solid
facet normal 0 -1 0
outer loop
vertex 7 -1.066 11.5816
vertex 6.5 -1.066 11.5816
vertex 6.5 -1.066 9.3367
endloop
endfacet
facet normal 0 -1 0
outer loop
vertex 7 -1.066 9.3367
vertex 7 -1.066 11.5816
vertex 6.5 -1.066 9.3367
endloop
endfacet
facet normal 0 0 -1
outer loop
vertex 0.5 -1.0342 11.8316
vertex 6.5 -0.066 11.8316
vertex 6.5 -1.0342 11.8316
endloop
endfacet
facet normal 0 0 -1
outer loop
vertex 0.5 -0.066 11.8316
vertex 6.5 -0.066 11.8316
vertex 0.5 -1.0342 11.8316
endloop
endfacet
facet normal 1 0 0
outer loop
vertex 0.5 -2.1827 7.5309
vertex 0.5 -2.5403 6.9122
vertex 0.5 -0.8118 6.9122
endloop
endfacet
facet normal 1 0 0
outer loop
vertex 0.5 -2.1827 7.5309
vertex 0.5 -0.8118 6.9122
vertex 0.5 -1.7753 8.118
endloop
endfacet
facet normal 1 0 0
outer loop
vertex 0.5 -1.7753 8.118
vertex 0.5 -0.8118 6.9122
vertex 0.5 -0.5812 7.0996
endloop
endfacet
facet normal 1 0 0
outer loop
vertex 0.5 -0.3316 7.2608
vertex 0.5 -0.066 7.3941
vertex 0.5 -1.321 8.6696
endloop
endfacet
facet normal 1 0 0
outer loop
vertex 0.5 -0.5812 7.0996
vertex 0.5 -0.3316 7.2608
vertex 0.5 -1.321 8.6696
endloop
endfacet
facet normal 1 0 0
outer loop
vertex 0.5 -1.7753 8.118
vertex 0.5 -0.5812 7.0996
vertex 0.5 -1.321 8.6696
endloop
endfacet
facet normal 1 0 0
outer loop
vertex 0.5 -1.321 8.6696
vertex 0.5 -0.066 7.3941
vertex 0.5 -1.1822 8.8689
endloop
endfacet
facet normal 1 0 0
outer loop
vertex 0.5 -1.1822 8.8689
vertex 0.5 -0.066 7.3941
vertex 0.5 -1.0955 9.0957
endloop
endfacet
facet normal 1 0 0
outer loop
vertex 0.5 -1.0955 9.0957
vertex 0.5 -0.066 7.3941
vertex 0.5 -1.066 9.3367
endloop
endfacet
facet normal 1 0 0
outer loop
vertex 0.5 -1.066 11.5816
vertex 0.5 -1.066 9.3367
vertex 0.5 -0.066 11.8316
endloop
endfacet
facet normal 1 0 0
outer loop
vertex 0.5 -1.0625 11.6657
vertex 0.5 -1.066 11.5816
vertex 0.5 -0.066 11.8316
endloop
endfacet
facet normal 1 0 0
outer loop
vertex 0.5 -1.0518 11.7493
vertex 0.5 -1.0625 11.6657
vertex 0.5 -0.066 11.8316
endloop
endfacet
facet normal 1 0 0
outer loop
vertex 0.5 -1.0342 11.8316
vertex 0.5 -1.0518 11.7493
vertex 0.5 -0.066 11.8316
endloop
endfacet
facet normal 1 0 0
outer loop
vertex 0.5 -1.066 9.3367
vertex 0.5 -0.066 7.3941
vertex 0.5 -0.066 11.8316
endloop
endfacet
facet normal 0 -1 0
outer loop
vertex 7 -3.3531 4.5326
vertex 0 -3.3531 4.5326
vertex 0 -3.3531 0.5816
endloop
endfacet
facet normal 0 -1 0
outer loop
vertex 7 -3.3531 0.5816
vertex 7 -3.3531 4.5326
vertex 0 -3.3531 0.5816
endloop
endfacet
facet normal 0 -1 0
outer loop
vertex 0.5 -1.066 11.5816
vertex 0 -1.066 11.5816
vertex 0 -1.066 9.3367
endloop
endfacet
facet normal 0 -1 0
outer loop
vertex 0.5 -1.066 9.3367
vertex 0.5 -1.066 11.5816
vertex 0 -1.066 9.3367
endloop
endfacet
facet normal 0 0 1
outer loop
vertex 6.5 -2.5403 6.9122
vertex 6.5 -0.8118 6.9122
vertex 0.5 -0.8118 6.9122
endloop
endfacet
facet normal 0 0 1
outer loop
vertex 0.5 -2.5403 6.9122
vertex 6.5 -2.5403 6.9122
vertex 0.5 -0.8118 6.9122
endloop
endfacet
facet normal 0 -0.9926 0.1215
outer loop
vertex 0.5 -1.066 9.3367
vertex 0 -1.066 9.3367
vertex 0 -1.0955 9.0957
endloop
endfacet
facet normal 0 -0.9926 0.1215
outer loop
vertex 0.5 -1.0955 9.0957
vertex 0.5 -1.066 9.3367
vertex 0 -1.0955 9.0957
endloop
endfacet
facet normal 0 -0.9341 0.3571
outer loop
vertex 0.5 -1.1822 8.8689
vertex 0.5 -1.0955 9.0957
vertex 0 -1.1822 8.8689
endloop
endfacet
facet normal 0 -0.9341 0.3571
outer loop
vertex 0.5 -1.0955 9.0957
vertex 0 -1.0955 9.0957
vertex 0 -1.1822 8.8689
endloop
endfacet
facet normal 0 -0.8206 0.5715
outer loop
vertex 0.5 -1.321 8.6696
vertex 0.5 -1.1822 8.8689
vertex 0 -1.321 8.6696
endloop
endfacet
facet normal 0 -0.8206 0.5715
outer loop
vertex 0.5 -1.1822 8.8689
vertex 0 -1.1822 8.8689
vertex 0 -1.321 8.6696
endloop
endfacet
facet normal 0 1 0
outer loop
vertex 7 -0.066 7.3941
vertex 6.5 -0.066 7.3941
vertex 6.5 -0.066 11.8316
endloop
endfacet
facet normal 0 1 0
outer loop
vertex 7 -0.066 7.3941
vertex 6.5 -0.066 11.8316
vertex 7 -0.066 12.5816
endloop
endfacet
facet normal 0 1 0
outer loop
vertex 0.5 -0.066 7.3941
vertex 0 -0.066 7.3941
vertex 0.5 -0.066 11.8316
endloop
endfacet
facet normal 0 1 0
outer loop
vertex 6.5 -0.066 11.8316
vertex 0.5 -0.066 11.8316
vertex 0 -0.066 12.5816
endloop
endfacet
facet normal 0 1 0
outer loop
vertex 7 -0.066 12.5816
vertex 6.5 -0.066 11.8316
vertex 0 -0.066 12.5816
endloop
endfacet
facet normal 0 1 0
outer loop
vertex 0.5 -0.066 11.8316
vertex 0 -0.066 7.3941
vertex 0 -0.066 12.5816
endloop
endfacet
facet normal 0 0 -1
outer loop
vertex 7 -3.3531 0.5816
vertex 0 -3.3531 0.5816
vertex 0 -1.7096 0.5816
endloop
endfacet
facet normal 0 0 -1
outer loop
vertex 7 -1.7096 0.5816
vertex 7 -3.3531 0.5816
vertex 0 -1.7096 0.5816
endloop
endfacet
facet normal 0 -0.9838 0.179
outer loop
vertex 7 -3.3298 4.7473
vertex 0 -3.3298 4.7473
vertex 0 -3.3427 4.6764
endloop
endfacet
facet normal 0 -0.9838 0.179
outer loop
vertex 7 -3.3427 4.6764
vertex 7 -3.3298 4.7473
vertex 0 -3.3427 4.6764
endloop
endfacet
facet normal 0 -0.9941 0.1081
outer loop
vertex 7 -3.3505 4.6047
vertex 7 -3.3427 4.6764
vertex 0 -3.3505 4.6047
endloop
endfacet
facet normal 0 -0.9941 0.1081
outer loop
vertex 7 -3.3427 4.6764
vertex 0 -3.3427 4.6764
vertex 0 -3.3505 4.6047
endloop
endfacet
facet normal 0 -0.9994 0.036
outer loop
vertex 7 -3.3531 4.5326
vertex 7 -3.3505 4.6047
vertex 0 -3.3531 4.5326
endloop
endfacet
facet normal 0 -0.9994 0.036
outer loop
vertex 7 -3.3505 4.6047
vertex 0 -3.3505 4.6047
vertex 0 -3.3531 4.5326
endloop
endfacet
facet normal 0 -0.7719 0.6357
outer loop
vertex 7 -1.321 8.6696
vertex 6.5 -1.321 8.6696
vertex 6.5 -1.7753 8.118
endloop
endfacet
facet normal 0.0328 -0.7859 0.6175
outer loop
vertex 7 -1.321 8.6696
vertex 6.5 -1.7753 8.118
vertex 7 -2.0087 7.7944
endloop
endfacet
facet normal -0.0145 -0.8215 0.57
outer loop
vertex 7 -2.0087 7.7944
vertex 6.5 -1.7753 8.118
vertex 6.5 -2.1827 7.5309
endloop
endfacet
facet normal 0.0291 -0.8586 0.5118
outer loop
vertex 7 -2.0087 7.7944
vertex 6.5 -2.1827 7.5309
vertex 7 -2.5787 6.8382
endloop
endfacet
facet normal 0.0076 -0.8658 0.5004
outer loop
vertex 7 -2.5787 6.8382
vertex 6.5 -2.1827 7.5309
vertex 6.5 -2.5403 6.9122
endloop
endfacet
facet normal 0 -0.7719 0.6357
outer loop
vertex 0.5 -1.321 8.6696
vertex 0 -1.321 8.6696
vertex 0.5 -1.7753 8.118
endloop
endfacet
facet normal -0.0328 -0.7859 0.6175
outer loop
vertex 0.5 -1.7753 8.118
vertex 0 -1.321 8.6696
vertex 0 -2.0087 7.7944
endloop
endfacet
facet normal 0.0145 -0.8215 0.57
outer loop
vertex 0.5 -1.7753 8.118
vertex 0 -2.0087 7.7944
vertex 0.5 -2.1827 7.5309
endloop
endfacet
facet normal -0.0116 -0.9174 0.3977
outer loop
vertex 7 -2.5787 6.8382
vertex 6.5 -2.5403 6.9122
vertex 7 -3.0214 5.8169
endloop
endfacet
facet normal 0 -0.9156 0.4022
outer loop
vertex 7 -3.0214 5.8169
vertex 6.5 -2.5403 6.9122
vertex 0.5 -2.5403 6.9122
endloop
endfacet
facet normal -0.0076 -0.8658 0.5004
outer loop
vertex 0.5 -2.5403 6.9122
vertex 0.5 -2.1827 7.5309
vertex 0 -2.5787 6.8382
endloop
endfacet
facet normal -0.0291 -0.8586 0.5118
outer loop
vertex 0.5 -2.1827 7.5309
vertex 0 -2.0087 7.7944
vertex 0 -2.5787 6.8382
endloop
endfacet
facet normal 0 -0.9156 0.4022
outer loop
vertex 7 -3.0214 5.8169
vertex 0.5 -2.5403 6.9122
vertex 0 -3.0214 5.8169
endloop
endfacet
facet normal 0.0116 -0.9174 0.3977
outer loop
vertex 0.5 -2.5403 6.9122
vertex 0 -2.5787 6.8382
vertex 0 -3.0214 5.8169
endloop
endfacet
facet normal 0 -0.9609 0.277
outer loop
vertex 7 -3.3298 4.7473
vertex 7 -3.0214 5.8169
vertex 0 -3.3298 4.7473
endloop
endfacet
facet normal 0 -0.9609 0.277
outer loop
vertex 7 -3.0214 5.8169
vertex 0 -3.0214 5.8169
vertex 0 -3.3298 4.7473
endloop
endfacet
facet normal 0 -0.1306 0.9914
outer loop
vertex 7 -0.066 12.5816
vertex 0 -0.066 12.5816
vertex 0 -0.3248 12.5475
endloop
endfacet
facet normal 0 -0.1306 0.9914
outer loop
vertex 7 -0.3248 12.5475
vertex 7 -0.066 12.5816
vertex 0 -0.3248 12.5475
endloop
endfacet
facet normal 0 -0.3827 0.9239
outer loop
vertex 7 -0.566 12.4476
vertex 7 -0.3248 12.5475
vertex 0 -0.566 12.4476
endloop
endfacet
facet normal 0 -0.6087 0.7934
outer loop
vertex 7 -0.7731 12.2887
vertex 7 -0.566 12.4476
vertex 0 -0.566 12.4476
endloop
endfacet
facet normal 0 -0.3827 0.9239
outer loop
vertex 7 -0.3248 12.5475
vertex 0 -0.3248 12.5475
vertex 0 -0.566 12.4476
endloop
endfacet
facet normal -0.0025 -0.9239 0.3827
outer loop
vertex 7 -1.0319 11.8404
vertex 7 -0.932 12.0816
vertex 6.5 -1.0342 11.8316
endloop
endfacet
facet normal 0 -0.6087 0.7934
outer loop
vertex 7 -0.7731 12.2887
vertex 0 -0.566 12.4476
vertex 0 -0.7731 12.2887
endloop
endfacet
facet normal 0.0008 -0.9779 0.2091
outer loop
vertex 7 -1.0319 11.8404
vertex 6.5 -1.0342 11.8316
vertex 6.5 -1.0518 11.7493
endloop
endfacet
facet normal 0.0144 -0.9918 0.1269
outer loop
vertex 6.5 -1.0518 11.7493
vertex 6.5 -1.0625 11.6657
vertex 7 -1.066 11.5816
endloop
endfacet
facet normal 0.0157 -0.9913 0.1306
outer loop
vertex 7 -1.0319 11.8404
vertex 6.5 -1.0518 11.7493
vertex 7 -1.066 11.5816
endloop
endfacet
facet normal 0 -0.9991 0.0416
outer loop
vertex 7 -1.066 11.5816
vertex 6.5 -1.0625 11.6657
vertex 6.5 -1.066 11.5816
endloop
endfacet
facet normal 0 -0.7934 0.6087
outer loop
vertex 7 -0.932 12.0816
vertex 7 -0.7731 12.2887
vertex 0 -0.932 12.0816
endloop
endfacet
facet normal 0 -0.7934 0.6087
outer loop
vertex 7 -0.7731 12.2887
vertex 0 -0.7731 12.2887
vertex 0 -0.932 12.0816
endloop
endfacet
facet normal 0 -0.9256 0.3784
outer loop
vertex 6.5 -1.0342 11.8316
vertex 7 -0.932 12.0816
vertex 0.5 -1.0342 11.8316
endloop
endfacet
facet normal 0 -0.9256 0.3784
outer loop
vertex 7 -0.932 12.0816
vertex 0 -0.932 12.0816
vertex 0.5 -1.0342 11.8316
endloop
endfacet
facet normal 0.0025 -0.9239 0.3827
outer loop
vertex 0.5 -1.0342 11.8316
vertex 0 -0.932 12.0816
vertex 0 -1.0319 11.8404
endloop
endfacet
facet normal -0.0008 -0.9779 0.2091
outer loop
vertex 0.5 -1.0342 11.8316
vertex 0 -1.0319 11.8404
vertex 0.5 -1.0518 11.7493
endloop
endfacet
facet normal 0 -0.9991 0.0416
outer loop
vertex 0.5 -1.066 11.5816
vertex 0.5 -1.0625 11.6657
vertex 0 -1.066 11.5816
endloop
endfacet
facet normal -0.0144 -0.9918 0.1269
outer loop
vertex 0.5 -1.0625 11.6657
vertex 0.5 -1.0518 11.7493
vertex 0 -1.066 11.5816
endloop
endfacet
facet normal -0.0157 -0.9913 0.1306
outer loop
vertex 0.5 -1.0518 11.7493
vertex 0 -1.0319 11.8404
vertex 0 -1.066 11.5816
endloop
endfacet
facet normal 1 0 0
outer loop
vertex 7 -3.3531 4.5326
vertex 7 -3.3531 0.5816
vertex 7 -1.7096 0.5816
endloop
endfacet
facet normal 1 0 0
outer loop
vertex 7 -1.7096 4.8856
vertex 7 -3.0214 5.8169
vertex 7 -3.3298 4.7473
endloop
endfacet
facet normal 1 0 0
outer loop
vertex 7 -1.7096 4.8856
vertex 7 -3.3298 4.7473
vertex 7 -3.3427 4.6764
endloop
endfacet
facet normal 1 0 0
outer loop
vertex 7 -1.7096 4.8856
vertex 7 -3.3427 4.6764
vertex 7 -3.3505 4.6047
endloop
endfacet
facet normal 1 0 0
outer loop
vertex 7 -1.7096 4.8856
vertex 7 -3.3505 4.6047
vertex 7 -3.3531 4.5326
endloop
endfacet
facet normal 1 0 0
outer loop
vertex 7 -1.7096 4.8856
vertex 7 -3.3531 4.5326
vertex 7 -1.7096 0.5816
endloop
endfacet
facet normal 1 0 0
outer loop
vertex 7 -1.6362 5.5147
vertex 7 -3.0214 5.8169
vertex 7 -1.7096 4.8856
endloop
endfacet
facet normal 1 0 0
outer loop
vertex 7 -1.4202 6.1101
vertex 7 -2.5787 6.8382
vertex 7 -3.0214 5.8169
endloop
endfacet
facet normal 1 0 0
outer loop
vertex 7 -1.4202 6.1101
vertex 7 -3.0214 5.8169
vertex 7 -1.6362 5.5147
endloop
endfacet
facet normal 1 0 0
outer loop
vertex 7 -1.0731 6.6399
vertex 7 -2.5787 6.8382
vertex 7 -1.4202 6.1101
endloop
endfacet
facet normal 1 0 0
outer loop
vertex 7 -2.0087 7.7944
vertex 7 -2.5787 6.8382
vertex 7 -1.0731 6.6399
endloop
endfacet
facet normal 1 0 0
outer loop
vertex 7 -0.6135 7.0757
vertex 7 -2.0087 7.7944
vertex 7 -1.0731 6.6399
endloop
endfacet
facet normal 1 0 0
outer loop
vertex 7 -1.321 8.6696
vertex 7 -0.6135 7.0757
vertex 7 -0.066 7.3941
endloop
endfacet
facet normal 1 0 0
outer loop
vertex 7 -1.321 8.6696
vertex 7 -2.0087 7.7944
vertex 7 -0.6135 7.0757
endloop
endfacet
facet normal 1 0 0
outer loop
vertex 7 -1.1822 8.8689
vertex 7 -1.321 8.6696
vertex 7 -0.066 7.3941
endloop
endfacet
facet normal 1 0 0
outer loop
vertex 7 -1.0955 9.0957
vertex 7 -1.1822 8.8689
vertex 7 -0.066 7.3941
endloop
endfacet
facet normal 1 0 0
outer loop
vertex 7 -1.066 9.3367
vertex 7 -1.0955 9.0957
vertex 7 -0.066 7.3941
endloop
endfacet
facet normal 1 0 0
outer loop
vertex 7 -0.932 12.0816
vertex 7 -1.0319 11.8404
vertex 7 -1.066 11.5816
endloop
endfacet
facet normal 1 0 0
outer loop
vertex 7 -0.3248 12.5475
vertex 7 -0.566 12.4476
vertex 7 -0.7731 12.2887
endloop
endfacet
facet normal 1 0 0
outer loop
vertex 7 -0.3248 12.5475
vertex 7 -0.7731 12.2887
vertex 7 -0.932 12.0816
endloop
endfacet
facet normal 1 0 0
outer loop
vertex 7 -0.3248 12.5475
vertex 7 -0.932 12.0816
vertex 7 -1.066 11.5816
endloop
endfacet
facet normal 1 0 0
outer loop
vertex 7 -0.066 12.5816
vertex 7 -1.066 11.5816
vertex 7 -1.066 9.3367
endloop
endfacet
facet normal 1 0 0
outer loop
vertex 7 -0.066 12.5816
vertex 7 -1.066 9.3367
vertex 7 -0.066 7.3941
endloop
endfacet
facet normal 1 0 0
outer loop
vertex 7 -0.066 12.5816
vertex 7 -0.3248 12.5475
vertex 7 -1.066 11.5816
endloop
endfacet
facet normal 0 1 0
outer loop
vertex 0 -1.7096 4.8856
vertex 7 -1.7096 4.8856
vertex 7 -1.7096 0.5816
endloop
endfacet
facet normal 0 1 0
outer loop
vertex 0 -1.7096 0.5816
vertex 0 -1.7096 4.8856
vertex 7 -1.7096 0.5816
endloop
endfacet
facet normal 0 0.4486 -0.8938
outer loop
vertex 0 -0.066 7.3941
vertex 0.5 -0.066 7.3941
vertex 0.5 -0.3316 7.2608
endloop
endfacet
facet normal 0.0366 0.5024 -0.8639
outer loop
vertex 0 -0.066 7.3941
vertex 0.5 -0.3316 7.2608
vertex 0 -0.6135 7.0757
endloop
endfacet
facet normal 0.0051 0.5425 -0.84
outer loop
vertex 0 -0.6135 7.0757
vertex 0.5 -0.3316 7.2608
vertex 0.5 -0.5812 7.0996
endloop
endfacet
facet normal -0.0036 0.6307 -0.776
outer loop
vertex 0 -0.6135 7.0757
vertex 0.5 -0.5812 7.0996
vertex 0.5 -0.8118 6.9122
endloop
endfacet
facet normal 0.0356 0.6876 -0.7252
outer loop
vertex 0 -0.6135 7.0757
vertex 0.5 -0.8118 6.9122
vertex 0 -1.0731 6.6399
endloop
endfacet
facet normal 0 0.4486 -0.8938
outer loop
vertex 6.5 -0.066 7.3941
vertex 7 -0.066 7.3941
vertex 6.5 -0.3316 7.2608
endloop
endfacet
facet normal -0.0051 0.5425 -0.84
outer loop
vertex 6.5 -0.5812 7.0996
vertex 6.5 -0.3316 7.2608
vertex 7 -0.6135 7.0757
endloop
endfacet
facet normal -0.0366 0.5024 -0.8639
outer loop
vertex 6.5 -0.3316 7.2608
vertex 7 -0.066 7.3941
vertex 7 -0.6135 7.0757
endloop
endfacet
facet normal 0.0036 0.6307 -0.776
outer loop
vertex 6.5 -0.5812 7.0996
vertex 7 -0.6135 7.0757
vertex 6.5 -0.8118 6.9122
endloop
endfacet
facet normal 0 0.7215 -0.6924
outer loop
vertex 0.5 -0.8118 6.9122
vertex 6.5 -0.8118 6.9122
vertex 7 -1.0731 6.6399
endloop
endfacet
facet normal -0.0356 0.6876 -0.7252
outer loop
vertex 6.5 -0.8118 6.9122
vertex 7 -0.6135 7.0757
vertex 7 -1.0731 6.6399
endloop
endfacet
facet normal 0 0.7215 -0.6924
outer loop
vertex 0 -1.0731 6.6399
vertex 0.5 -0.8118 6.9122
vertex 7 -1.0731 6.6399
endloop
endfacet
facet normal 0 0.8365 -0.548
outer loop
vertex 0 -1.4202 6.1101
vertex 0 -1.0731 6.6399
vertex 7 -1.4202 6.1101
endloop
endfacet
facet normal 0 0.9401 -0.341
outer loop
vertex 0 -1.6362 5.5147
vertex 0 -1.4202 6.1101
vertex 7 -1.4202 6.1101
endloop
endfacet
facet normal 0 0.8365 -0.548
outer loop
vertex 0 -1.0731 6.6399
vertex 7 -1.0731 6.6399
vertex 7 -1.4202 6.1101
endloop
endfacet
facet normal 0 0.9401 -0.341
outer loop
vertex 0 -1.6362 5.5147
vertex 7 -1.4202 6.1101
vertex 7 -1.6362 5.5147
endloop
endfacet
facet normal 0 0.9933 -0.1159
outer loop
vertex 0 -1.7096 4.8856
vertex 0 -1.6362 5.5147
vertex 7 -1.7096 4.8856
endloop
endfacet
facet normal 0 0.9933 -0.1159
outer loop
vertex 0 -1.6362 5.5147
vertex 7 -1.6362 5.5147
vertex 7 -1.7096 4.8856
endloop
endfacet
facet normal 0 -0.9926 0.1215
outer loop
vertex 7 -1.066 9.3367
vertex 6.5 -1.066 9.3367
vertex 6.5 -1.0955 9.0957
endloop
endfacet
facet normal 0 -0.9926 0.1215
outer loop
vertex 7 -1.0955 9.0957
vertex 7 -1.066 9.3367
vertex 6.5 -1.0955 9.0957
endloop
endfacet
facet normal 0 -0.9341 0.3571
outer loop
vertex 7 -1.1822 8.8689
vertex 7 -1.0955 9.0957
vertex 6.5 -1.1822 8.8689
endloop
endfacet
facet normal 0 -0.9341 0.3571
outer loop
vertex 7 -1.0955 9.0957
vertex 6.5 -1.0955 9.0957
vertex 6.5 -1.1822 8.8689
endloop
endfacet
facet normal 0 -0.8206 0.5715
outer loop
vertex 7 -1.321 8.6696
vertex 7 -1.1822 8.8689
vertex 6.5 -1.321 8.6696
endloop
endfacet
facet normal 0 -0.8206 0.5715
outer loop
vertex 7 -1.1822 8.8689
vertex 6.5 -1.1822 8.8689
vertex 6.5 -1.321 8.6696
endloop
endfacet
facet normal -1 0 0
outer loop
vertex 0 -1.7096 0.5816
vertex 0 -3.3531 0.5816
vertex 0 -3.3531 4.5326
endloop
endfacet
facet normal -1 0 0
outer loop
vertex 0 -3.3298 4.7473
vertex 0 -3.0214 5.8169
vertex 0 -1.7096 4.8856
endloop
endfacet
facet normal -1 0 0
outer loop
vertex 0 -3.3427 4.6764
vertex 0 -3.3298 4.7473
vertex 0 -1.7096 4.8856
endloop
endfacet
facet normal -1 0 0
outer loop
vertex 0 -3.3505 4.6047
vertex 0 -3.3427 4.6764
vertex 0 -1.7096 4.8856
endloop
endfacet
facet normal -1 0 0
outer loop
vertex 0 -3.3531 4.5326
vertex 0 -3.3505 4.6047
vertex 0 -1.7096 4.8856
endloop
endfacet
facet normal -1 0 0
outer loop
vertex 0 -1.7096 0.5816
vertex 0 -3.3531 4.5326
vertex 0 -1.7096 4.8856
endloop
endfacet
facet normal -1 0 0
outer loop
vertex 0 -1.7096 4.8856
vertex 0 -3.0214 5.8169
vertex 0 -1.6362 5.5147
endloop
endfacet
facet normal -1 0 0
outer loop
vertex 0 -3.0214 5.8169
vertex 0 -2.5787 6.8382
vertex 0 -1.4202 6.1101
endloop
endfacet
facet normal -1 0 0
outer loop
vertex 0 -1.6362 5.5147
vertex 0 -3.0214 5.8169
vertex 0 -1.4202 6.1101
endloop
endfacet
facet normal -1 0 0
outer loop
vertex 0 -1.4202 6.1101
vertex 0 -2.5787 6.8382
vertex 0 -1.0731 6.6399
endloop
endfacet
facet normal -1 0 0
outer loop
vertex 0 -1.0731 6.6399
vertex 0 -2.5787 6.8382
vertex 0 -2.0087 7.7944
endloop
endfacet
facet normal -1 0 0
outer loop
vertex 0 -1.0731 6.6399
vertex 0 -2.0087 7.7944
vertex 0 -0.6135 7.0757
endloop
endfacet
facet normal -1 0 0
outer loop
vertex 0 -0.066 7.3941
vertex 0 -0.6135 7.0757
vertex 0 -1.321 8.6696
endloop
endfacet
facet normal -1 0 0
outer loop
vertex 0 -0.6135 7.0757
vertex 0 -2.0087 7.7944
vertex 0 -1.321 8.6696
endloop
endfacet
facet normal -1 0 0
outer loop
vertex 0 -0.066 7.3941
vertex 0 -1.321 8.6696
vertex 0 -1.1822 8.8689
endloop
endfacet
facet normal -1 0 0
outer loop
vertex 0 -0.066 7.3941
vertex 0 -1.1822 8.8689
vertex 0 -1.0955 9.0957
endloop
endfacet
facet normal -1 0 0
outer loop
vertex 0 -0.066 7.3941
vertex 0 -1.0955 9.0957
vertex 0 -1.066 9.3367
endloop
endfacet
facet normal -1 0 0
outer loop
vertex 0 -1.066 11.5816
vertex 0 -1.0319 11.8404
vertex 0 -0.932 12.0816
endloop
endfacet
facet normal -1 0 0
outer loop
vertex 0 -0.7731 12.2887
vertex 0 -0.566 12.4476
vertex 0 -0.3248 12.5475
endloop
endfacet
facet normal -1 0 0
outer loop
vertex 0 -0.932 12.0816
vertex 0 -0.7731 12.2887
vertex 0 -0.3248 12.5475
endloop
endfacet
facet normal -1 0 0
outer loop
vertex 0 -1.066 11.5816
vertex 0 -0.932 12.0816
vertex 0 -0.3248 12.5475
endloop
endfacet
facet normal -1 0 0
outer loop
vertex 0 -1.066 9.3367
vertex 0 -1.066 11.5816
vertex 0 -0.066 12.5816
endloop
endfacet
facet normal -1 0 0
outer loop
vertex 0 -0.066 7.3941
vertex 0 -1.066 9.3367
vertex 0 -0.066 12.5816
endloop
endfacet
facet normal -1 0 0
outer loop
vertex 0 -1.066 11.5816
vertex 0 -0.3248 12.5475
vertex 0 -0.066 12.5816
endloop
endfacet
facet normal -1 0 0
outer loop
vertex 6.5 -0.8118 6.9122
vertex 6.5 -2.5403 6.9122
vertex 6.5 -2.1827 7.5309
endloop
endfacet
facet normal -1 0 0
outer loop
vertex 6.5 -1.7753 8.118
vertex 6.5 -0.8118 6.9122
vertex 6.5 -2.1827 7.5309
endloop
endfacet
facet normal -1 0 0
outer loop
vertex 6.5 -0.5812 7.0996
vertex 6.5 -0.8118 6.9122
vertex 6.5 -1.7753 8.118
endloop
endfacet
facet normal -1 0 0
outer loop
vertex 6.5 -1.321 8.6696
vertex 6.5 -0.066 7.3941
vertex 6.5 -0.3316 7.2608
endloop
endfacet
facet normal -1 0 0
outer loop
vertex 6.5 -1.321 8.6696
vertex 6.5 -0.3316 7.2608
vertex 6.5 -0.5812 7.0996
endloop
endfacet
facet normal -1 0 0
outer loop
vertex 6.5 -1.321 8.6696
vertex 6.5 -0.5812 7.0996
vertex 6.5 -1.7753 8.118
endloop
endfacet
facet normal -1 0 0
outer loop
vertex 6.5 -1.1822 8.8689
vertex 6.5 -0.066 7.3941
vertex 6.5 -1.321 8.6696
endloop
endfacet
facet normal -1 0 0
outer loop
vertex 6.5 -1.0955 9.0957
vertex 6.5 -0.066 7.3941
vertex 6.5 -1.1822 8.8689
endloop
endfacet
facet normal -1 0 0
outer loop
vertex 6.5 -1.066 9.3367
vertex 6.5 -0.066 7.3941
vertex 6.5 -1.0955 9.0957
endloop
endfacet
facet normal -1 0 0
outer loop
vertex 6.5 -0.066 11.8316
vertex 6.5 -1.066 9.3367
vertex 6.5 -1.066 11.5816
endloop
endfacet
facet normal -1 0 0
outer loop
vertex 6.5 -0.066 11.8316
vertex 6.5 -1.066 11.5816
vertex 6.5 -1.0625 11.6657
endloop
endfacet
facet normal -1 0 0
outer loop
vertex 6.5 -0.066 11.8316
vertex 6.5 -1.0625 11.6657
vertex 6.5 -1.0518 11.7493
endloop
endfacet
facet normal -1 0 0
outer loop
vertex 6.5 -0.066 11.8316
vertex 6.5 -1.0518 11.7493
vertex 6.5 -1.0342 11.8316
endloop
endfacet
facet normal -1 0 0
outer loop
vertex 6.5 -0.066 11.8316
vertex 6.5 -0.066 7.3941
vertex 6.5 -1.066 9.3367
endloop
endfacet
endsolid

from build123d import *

# Parameters (mm, degrees)
F1_DEPTH = 7
F2_W     = 6
F2_H     = 4.91947
F3_DEPTH = 3.288103
F5_DEPTH = 7.001


with BuildPart() as f1:
    # F0 (on Right) → F1 (new body)
    with BuildSketch(Plane.YZ):
        with BuildLine():
            Line((-3.353103, 0.58162), (-0.066, 0.58162))
            Line((-0.066, 0.58162), (-0.066, 12.58162))
            ThreePointArc((-0.066, 12.58162), (-0.773107, 12.288727), (-1.066, 11.58162))
            Line((-1.066, 11.58162), (-1.066, 9.336664))
            ThreePointArc((-1.066, 9.336664), (-1.131912, 8.979622), (-1.32096, 8.669645))
            ThreePointArc((-1.32096, 8.669645), (-2.578651, 6.838208), (-3.329772, 4.74733))
            ThreePointArc((-3.329772, 4.74733), (-3.347253, 4.640585), (-3.353103, 4.532576))
            Line((-3.353103, 4.532576), (-3.353103, 0.58162))
        make_face()
    extrude(amount=F1_DEPTH)

    # F2 (on face) → F3 (cut, through all)
    with BuildSketch(Plane(origin=(0, -0.066, 0), x_dir=(-1, 0, 0), z_dir=(0, 1, 0))):
        with Locations((-3.5, 9.371885)):
            Rectangle(F2_W, F2_H)
    extrude(amount=-F3_DEPTH, mode=Mode.SUBTRACT)

    # F4 (on face) → F5 (cut, through all)
    with BuildSketch(Plane.YZ.offset(7)):
        with BuildLine():
            Line((-1.709552, 4.885615), (-1.709552, 0.58162))
            Line((-1.709552, 0.58162), (-0.066, 0.58162))
            Line((-0.066, 0.58162), (-0.066, 2.014811))
            Line((-0.066, 2.014811), (-0.066, 7.394113))
            ThreePointArc((-0.066, 7.394113), (-1.262072, 6.3851), (-1.709552, 4.885615))
        make_face()
    extrude(amount=-F5_DEPTH, mode=Mode.SUBTRACT)


solid = f1.part
